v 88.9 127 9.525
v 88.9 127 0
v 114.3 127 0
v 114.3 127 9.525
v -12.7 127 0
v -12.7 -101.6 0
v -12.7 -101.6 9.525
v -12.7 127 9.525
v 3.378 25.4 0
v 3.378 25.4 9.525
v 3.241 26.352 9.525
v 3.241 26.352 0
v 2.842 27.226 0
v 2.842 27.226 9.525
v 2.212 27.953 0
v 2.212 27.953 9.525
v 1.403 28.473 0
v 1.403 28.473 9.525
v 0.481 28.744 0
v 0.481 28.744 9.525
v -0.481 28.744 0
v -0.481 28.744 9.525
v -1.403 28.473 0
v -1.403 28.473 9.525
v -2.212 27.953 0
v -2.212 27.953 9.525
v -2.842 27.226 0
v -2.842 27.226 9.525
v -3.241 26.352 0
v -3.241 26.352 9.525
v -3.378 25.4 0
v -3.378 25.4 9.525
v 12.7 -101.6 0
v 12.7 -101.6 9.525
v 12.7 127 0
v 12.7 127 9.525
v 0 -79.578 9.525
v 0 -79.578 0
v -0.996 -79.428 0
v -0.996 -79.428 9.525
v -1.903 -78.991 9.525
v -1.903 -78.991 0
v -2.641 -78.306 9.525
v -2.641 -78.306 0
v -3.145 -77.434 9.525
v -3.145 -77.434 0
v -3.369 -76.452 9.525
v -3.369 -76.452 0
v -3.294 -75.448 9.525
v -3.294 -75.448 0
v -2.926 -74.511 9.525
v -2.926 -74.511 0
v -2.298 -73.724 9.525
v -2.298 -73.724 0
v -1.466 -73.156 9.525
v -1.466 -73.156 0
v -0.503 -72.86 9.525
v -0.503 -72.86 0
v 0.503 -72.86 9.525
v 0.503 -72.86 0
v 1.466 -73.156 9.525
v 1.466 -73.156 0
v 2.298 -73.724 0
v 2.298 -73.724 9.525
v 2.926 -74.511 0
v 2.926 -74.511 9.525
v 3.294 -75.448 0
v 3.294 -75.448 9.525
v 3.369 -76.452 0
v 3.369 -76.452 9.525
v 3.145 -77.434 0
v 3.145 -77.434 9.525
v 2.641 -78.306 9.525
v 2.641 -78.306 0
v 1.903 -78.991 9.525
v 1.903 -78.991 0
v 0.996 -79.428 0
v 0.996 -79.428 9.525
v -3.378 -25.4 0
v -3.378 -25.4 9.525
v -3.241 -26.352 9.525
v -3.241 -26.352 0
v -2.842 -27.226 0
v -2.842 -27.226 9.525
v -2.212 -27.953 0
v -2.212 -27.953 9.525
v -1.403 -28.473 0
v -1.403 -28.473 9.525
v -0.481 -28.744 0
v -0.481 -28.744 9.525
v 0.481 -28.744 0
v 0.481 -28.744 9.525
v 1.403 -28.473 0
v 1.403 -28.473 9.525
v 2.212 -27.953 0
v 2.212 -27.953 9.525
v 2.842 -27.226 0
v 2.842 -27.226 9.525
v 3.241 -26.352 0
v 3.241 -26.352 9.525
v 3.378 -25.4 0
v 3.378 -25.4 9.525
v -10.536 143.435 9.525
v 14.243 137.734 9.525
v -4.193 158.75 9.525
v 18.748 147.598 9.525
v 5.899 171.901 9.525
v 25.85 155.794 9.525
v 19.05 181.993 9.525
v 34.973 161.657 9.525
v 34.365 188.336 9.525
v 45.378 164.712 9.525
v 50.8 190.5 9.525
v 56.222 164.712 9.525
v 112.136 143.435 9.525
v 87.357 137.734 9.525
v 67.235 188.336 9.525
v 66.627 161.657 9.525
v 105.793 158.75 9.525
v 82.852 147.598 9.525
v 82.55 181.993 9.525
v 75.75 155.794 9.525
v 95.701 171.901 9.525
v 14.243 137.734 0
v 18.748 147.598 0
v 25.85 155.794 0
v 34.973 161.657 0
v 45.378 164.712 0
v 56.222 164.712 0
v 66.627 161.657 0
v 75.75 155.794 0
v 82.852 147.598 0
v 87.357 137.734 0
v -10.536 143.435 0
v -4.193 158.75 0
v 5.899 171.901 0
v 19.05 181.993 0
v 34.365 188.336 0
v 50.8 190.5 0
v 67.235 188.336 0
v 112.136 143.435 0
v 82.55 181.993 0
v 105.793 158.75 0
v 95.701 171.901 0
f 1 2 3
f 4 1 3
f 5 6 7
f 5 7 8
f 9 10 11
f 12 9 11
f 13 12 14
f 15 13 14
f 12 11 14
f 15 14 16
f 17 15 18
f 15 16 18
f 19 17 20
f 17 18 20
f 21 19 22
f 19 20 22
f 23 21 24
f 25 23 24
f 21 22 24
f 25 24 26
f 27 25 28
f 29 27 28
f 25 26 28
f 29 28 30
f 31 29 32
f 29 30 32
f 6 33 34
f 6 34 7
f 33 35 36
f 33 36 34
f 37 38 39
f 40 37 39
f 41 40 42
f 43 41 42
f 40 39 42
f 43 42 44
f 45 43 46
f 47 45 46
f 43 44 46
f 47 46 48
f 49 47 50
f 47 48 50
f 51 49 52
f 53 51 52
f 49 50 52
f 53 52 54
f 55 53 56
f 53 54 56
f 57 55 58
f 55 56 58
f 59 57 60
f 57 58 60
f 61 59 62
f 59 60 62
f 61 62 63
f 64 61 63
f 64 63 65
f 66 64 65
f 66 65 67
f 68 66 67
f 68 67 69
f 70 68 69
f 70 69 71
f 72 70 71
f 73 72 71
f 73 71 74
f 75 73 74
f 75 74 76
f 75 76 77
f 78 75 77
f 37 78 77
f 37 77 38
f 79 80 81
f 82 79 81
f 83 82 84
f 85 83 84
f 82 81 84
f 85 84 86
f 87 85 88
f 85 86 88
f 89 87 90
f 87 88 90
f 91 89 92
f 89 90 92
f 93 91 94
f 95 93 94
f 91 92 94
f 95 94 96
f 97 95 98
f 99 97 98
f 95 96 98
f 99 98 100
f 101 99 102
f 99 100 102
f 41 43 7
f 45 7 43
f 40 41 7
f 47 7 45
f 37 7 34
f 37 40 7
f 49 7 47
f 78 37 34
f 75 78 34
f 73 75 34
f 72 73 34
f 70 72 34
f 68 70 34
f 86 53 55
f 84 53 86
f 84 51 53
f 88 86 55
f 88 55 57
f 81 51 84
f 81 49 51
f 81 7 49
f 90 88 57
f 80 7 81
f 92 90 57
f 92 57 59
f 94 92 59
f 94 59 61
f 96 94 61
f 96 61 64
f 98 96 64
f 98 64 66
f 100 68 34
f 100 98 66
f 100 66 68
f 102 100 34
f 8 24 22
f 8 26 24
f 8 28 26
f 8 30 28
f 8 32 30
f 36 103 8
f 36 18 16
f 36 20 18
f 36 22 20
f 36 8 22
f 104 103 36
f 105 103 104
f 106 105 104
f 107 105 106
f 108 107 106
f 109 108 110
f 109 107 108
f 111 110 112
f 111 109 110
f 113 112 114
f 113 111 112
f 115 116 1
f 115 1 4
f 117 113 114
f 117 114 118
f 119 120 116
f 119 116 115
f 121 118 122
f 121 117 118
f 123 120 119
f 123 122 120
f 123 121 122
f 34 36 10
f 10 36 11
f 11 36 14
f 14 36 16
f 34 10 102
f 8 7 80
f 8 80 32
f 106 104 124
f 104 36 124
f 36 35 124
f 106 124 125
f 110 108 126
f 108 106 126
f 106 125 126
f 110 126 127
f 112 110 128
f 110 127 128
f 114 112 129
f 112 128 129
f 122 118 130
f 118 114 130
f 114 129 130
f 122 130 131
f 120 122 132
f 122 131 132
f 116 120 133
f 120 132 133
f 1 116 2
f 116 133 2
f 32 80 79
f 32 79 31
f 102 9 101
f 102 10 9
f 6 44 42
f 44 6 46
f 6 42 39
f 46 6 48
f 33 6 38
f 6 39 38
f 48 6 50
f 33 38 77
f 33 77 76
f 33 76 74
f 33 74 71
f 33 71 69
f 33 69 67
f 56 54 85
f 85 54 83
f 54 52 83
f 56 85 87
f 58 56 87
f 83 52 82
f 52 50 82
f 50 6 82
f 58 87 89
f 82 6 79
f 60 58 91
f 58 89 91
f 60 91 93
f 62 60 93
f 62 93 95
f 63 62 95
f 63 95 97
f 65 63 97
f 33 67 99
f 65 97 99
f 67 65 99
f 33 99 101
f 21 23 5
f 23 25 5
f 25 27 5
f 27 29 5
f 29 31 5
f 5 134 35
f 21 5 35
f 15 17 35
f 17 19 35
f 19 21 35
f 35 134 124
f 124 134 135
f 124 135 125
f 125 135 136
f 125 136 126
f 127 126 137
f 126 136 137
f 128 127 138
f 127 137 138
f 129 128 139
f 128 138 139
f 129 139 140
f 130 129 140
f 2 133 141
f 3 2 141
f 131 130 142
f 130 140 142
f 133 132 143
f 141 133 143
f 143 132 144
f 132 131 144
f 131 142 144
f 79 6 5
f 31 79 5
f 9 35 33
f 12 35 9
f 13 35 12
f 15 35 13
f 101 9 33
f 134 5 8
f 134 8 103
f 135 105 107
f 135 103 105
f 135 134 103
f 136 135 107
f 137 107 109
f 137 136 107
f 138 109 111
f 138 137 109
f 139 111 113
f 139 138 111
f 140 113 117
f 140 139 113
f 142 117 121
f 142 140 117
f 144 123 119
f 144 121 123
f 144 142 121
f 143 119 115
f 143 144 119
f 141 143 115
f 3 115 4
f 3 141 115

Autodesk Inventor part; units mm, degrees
ref_plane "YZ Plane" through (0, 0, 0) normal (1, 0, 0) x (0, 1, 0)
ref_plane "XZ Plane" through (0, 0, 0) normal (0, 1, 0) x (-1, 0, 0)
ref_plane "XY Plane" through (0, 0, 0) normal (0, 0, 1) x (1, 0, 0)
sketch "Sketch1" plane through (0, 0, 0) normal (0, 0, 1) x (1, 0, 0)
  line L0 (12.7, 127) -> (12.7, -101.6)
  line L1 (12.7, -101.6) -> (-12.7, -101.6)
  line L2 (-12.7, -101.6) -> (-12.7, 127)
  arc A0 (88.9, 127) -> (12.7, 127) centre (50.8, 127) ccw
  arc A1 (114.3, 127) -> (-12.7, 127) centre (50.8, 127) ccw
  line L3 (88.9, 127) -> (114.3, 127)
  point P0 (0, 588.8574)
  point P1 (0, -101.6)
  dimension "d6" = 25.4
  dimension "d7" = 38.1
extrude "Extrusion1" add sketch "Sketch1" along normal blind 9.525
sketch "Sketch3" plane through (0, 0, 9.525) normal (0, 0, 1) x (1, 0, 0)
  line L0 (-12.7, 127) -> (-12.7, -101.6) projected
  line L1 (-12.7, -101.6) -> (12.7, -101.6) projected
  line L2 (12.7, -101.6) -> (12.7, 127) projected
  arc A0 (88.9, 127) -> (12.7, 127) centre (50.8, 127) ccw projected
  line L3 (88.9, 127) -> (114.3, 127) projected
  arc A1 (114.3, 127) -> (-12.7, 127) centre (50.8, 127) ccw projected
  point P0 (0, 0)
  point P1 (0, -76.2)
  dimension "d20" = 12.7
  dimension "d21" = 12.7
  dimension "d22" = 25.4
hole "Hole1" at (0, -76.2, 9.525) direction (0, 0, -1) diameter 6.7564 end through all clearance for "Flat Head Machine Screw (82)" size "1/4" standard "Ansi Unified Screw Threads"
sketch "Sketch4" plane through (0, 0, 9.525) normal (0, 0, 1) x (1, 0, 0)
  circle A0 centre (0, -76.2) radius 3.3782 projected
  line L0 (-12.7, 127) -> (-12.7, -101.6) projected
  line L1 (-12.7, -101.6) -> (12.7, -101.6) projected
  line L2 (12.7, -101.6) -> (12.7, 127) projected
  arc A1 (88.9, 127) -> (12.7, 127) centre (50.8, 127) ccw projected
  line L3 (88.9, 127) -> (114.3, 127) projected
  arc A2 (114.3, 127) -> (-12.7, 127) centre (50.8, 127) ccw projected
  line L4 (-3.3782, -25.4) -> (-3.3782, 25.4)
  line L5 (3.3782, 25.4) -> (3.3782, -25.4)
  circle A3 centre (0, -76.2) radius 3.3782 projected
  arc A4 (3.3782, 25.4) -> (-3.3782, 25.4) centre (0, 25.4) ccw
  arc A5 (-3.3782, -25.4) -> (3.3782, -25.4) centre (0, -25.4) ccw
  point P0 (0, 0)
  dimension "d23" = 50.8
  dimension "d24" = 50.8
extrude "Extrusion2" cut sketch "Sketch4" against normal through all contours L4 A4 L5 A5
equation "\"d20\" = d21"
properties part number "ScissorHookTry"
